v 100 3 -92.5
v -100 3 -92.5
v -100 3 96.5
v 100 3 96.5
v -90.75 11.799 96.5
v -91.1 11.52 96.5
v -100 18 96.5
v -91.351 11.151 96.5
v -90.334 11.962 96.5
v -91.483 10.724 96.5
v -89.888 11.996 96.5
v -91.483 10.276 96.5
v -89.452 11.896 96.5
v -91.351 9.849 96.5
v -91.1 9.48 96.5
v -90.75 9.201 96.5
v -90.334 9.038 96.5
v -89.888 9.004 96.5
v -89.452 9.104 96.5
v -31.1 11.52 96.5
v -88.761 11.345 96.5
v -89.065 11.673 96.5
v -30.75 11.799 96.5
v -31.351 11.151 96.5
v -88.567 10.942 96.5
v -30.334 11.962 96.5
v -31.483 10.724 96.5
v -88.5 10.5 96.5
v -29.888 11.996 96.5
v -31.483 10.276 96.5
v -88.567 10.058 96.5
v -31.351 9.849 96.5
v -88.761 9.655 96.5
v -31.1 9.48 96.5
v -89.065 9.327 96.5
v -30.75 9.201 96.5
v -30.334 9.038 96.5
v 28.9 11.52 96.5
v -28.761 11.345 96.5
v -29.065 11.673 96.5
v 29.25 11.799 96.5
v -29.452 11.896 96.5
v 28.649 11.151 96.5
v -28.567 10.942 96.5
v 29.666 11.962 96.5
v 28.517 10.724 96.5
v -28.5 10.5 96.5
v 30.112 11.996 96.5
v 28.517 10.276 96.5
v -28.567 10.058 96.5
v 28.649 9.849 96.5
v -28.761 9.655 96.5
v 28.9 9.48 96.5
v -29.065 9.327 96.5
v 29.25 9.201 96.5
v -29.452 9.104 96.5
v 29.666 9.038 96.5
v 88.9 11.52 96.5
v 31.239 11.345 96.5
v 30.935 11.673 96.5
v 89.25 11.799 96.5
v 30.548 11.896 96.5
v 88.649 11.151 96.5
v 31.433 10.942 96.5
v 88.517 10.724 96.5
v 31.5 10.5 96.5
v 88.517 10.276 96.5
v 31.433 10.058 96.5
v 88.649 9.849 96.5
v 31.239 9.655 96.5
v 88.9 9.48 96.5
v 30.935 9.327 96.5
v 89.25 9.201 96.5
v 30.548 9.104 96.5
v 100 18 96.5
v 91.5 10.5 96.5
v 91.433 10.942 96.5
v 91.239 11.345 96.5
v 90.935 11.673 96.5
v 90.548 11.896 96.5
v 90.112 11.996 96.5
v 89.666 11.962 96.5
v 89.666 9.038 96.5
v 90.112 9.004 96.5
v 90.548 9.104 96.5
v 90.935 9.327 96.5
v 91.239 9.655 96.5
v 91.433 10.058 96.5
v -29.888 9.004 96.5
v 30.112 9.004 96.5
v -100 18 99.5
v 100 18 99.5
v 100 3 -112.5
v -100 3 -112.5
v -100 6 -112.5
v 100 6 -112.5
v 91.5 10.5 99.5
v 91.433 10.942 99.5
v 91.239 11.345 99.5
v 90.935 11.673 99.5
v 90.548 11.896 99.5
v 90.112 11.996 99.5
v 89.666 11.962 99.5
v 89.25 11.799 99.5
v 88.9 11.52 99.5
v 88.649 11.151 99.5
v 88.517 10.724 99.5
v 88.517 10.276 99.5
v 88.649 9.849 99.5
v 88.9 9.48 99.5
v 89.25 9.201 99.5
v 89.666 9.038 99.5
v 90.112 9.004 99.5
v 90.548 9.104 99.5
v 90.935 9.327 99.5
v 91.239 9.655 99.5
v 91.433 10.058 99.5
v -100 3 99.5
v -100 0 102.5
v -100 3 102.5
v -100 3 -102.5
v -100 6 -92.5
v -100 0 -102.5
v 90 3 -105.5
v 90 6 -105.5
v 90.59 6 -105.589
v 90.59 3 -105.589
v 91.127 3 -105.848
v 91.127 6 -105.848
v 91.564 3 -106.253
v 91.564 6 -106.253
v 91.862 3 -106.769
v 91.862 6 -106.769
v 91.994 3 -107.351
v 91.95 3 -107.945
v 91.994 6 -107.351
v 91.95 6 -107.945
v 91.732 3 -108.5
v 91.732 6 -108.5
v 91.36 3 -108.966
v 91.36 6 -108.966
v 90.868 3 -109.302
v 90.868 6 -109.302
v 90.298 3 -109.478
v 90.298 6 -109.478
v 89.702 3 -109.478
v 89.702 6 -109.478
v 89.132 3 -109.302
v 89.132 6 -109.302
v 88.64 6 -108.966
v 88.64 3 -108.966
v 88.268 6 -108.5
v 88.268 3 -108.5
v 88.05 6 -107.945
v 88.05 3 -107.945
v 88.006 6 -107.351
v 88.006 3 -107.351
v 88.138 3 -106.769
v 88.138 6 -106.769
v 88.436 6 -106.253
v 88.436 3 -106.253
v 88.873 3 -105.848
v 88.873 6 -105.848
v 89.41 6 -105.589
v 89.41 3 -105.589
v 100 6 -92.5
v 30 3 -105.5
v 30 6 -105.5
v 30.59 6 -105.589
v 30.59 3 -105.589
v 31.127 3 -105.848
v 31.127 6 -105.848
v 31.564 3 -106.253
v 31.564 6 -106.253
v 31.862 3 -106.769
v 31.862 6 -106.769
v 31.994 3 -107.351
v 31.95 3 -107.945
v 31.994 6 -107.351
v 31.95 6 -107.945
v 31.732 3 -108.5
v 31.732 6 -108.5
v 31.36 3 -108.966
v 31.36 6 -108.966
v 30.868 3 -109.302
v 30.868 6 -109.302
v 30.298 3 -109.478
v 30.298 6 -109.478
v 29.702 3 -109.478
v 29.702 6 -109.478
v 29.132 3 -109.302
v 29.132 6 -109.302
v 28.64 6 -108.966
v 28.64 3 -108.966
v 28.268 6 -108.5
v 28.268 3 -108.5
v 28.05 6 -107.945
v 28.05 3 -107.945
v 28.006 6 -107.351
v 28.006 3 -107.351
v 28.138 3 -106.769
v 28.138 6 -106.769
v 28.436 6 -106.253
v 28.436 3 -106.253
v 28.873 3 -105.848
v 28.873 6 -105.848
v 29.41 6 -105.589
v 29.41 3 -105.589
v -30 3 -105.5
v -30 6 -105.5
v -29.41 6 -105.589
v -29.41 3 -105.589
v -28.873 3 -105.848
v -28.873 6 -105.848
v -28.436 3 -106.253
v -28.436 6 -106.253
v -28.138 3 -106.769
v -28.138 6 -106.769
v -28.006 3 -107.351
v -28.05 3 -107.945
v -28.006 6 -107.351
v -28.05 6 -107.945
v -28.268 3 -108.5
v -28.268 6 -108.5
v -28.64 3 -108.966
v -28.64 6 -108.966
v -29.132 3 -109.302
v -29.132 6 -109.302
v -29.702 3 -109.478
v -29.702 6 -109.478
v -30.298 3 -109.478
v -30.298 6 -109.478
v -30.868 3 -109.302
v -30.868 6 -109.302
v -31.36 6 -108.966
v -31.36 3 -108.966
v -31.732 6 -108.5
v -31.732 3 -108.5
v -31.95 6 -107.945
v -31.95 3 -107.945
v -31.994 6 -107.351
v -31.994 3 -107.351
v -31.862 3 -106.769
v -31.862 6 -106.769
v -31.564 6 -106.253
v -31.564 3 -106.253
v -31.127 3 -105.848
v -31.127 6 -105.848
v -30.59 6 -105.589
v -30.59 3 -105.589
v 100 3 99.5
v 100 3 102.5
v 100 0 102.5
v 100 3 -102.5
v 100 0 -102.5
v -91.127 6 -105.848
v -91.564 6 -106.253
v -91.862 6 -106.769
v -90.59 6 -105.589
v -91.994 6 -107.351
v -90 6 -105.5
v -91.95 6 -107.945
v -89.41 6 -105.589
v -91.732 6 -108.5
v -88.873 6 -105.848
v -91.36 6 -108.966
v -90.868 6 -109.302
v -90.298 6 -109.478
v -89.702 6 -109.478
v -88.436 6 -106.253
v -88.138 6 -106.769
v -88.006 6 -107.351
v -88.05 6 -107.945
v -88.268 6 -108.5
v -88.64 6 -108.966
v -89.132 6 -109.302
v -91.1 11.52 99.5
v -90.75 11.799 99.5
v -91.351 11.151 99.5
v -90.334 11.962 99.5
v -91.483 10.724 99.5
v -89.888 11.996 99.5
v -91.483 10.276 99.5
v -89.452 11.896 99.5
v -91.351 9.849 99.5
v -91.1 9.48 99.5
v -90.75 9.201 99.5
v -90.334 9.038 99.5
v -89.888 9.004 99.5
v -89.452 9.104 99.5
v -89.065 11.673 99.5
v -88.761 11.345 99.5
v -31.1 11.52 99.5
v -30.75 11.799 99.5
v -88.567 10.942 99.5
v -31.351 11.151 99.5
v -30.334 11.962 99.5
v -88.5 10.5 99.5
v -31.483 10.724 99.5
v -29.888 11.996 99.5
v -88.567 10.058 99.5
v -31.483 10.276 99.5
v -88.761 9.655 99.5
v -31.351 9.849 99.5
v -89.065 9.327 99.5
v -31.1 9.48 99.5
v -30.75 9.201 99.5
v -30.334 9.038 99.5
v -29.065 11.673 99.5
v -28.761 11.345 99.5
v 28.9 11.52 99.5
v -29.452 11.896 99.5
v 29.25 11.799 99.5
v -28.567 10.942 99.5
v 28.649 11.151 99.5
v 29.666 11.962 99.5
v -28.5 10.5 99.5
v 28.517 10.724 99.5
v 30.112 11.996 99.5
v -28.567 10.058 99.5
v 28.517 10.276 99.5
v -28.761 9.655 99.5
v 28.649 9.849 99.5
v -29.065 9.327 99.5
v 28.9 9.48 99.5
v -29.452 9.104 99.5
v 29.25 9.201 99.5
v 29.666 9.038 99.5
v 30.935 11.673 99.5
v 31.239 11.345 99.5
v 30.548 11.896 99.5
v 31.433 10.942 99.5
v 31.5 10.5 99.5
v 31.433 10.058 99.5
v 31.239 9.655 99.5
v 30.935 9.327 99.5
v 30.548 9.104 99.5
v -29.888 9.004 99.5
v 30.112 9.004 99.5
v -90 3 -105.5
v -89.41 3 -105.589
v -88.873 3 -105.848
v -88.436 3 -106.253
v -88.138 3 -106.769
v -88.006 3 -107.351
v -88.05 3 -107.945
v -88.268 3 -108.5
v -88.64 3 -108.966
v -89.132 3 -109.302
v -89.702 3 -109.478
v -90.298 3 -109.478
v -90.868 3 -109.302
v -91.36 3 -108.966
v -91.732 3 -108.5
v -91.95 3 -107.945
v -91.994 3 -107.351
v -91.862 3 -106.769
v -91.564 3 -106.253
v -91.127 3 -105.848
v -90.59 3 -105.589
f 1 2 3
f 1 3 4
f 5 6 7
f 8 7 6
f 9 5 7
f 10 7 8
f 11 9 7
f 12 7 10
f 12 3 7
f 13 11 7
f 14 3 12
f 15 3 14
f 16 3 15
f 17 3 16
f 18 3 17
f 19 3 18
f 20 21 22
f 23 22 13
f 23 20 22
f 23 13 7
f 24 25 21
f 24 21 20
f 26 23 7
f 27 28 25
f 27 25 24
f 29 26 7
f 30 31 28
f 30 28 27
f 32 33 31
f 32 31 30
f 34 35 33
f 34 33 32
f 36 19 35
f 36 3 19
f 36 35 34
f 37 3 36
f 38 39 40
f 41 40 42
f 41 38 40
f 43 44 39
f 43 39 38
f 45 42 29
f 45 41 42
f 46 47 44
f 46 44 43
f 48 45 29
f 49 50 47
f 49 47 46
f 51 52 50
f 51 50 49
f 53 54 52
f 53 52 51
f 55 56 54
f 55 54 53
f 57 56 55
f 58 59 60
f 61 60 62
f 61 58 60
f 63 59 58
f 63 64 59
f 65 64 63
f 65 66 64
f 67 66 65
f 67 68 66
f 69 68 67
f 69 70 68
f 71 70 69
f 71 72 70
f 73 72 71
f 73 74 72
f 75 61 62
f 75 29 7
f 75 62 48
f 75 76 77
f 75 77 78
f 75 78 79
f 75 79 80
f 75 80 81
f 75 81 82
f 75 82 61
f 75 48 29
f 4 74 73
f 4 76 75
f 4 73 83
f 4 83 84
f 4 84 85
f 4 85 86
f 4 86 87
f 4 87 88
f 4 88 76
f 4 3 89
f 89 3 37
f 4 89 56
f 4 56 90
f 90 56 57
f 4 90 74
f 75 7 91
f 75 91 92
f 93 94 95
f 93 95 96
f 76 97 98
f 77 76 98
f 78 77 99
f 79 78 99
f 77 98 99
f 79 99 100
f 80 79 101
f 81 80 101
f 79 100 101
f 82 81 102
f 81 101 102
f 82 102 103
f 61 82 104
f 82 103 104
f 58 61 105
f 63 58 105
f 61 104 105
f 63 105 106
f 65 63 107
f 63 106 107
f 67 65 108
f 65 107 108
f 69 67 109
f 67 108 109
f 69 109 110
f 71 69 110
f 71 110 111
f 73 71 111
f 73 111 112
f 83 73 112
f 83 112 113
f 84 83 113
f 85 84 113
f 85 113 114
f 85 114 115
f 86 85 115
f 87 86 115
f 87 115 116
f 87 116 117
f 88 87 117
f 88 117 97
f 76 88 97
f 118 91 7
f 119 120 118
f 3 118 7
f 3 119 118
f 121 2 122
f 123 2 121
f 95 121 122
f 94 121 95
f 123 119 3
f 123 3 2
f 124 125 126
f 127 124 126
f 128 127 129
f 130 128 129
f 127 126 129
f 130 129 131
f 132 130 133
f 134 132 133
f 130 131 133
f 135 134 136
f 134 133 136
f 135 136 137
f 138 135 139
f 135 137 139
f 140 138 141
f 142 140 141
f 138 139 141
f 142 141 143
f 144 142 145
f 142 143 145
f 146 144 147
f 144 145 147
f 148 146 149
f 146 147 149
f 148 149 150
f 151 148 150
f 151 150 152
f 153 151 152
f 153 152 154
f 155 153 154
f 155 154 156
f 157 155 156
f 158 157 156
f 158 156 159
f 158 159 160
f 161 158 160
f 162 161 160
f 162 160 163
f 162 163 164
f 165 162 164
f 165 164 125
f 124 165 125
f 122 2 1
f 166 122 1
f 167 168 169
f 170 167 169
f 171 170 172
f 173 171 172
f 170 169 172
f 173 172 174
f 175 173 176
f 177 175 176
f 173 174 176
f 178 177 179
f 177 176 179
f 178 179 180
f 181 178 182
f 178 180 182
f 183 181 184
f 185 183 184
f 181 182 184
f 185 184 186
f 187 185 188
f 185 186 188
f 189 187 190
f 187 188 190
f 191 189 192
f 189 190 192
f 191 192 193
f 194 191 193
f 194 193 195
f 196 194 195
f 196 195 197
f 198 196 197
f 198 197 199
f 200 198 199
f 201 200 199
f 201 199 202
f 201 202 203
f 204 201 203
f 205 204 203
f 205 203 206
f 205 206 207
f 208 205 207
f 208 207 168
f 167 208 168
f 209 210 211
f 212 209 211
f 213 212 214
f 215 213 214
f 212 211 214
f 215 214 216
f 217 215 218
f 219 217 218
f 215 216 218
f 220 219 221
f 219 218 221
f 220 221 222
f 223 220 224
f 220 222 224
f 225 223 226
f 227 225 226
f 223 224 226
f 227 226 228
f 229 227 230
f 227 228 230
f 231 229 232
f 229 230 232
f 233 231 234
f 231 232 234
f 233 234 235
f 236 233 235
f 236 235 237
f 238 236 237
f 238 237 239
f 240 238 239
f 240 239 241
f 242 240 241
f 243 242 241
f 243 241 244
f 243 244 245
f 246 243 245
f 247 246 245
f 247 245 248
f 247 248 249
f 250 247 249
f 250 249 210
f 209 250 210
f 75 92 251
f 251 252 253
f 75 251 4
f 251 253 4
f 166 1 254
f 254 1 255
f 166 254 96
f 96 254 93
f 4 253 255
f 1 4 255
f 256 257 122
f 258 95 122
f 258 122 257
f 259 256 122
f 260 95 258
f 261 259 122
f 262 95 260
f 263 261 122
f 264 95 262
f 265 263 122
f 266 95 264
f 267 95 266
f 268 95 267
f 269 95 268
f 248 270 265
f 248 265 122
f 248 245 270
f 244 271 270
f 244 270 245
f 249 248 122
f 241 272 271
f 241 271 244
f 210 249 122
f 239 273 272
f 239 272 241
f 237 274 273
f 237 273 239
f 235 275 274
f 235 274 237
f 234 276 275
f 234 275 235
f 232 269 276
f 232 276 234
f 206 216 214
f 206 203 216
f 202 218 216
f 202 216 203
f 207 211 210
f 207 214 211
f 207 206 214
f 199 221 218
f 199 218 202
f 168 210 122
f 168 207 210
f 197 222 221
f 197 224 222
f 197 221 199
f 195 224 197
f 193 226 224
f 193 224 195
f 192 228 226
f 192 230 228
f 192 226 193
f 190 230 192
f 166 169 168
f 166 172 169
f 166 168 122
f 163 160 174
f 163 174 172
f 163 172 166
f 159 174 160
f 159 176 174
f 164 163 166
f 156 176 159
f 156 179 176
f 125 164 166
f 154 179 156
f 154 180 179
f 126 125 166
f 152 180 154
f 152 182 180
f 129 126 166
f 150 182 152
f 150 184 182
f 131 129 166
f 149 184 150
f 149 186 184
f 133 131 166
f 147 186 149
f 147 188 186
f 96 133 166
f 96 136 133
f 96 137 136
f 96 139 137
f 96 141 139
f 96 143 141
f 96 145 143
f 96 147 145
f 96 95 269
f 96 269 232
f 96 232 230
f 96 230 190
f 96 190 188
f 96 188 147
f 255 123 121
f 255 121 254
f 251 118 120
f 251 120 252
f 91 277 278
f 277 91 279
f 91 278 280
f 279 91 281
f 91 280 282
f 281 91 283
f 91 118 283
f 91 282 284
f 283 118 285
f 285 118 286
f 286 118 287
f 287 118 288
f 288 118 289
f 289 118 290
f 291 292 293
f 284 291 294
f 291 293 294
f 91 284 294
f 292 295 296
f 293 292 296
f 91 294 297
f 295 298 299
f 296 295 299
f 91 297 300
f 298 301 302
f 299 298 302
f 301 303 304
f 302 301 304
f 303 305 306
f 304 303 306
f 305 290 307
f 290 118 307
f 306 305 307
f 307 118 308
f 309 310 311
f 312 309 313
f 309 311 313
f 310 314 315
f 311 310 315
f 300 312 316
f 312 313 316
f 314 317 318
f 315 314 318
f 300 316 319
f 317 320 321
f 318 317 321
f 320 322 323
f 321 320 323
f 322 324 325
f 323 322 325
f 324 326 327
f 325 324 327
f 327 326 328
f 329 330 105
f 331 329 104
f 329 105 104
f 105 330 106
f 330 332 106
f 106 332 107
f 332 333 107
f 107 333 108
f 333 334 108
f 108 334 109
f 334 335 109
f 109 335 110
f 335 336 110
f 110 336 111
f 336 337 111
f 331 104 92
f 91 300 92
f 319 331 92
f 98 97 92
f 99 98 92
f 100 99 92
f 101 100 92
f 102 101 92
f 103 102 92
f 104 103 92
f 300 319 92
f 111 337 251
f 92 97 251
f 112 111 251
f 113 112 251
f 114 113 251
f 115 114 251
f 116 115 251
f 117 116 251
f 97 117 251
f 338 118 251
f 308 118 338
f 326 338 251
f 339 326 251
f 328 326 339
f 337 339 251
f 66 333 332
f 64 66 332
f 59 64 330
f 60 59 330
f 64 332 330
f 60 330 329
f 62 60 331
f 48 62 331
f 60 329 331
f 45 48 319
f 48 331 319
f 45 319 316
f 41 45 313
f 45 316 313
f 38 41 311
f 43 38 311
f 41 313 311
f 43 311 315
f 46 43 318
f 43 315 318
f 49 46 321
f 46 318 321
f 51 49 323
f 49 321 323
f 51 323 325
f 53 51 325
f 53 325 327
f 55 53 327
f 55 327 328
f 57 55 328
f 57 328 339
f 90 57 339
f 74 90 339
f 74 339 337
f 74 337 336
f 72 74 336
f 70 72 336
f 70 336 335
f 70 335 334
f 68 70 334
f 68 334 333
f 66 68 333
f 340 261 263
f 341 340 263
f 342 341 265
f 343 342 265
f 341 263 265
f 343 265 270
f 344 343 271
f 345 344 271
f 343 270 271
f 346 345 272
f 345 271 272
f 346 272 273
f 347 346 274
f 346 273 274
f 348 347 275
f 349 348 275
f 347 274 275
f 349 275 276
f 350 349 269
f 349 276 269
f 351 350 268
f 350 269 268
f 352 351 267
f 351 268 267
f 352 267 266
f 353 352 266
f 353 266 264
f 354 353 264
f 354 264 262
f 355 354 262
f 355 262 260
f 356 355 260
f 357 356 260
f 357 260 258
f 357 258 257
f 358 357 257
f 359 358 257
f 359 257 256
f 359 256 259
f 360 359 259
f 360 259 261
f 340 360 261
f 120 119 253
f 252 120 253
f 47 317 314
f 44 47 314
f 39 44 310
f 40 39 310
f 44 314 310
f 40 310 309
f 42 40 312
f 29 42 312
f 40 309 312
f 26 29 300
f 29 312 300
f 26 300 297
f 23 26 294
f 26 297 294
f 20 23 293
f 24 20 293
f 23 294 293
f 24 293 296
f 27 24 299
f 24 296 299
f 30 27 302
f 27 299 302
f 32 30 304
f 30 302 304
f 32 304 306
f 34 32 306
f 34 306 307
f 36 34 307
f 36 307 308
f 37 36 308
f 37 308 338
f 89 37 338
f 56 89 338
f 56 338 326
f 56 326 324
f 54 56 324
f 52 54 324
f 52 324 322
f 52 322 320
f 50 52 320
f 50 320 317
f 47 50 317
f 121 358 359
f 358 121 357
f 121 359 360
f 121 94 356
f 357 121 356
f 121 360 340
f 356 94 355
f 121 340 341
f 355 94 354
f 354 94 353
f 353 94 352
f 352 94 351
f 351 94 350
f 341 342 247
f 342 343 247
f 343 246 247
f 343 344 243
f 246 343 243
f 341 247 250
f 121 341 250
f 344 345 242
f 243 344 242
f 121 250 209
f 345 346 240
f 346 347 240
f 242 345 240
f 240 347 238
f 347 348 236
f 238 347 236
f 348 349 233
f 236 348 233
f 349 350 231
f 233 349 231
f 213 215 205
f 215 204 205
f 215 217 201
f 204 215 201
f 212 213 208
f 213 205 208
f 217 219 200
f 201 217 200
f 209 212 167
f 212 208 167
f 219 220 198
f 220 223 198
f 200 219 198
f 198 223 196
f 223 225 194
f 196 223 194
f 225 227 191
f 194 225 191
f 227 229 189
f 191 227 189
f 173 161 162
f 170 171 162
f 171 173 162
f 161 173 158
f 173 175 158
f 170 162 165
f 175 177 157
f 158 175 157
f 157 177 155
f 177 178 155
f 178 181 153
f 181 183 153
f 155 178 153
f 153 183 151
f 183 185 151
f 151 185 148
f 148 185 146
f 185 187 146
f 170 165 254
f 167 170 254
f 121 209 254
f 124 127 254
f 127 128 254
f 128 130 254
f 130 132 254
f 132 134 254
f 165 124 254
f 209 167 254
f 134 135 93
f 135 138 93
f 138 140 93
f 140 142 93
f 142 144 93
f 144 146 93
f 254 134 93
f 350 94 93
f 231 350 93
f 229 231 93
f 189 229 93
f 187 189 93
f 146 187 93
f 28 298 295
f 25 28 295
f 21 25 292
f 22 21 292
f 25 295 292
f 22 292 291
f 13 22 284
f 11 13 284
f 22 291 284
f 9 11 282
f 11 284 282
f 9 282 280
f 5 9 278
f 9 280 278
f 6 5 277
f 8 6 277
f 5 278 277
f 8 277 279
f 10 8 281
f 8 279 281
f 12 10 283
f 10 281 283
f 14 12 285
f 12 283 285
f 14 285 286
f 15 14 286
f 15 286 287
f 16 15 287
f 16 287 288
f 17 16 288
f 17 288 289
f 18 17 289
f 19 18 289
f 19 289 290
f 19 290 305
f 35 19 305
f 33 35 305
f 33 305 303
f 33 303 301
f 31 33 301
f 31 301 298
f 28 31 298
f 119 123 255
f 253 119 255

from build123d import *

# Parameters (mm, degrees)
SKETCH1_W           = 200
SKETCH1_H           = 205
BOSS_EXTRUDE1_DEPTH = 3
SKETCH2_W           = 200
SKETCH2_H           = 20
BOSS_EXTRUDE2_DEPTH = 3
CUT_EXTRUDE1_REACH  = 152.639
SKETCH3_R           = 2
LPATTERN1_COUNT     = 4
LPATTERN1_PITCH     = 60
SKETCH4_W           = 200
SKETCH4_H           = 3
BOSS_EXTRUDE3_DEPTH = 15
CUT_EXTRUDE2_REACH  = 237.091
SKETCH5_R           = 1.5
LPATTERN2_COUNT     = 4
LPATTERN2_PITCH     = 60


with BuildPart() as part:
    # Sketch1 → Boss-Extrude1 (new body)
    with BuildSketch(Plane(origin=(0, 0, 0), x_dir=(1, 0, 0), z_dir=(0, 1, 0))):
        Rectangle(SKETCH1_W, SKETCH1_H)
    extrude(amount=BOSS_EXTRUDE1_DEPTH)

    # Sketch2 → Boss-Extrude2 (add)
    with BuildSketch(Plane(origin=(0, 3, 0), x_dir=(1, 0, 0), z_dir=(0, 1, 0))):
        with Locations((0, 102.5)):
            Rectangle(SKETCH2_W, SKETCH2_H)
    extrude(amount=BOSS_EXTRUDE2_DEPTH)

    # Sketch3 → Cut-Extrude1 (cut, up to next)
    with BuildSketch(Plane(origin=(0, 6, 0), x_dir=(1, 0, 0), z_dir=(0, 1, 0)), mode=Mode.PRIVATE) as cut_extrude1_sk1:
        with Locations(Location((-90, 107.5, 0), (0, 0, 270))):
            Circle(SKETCH3_R)
    cut_extrude1_tool1 = extrude(cut_extrude1_sk1.sketch, amount=-CUT_EXTRUDE1_REACH, mode=Mode.PRIVATE) & part.part
    cut_extrude1 = cut_extrude1_tool1.solids().sort_by_distance((-90, 6, -107.5))[0]
    add(cut_extrude1, mode=Mode.SUBTRACT)

    # LPattern1: Cut-Extrude1 ×4
    with Locations(*[(i * LPATTERN1_PITCH, 0, 0) for i in range(1, LPATTERN1_COUNT)]):
        add(cut_extrude1, mode=Mode.SUBTRACT)

    # Sketch4 → Boss-Extrude3 (add)
    with BuildSketch(Plane(origin=(0, 3, 0), x_dir=(1, 0, 0), z_dir=(0, 1, 0))):
        with Locations((0, -98)):
            Rectangle(SKETCH4_W, SKETCH4_H)
    extrude(amount=BOSS_EXTRUDE3_DEPTH)

    # Sketch5 → Cut-Extrude2 (cut, up to next)
    with BuildSketch(Plane.XY.offset(99.5), mode=Mode.PRIVATE) as cut_extrude2_sk1:
        with Locations((-90, 10.5)):
            Circle(SKETCH5_R)
    cut_extrude2_tool1 = extrude(cut_extrude2_sk1.sketch, amount=-CUT_EXTRUDE2_REACH, mode=Mode.PRIVATE) & part.part
    cut_extrude2 = cut_extrude2_tool1.solids().sort_by_distance((-90, 10.5, 99.5))[0]
    add(cut_extrude2, mode=Mode.SUBTRACT)

    # LPattern2: Cut-Extrude2 ×4
    with Locations(*[(i * LPATTERN2_PITCH, 0, 0) for i in range(1, LPATTERN2_COUNT)]):
        add(cut_extrude2, mode=Mode.SUBTRACT)


solid = part.part
